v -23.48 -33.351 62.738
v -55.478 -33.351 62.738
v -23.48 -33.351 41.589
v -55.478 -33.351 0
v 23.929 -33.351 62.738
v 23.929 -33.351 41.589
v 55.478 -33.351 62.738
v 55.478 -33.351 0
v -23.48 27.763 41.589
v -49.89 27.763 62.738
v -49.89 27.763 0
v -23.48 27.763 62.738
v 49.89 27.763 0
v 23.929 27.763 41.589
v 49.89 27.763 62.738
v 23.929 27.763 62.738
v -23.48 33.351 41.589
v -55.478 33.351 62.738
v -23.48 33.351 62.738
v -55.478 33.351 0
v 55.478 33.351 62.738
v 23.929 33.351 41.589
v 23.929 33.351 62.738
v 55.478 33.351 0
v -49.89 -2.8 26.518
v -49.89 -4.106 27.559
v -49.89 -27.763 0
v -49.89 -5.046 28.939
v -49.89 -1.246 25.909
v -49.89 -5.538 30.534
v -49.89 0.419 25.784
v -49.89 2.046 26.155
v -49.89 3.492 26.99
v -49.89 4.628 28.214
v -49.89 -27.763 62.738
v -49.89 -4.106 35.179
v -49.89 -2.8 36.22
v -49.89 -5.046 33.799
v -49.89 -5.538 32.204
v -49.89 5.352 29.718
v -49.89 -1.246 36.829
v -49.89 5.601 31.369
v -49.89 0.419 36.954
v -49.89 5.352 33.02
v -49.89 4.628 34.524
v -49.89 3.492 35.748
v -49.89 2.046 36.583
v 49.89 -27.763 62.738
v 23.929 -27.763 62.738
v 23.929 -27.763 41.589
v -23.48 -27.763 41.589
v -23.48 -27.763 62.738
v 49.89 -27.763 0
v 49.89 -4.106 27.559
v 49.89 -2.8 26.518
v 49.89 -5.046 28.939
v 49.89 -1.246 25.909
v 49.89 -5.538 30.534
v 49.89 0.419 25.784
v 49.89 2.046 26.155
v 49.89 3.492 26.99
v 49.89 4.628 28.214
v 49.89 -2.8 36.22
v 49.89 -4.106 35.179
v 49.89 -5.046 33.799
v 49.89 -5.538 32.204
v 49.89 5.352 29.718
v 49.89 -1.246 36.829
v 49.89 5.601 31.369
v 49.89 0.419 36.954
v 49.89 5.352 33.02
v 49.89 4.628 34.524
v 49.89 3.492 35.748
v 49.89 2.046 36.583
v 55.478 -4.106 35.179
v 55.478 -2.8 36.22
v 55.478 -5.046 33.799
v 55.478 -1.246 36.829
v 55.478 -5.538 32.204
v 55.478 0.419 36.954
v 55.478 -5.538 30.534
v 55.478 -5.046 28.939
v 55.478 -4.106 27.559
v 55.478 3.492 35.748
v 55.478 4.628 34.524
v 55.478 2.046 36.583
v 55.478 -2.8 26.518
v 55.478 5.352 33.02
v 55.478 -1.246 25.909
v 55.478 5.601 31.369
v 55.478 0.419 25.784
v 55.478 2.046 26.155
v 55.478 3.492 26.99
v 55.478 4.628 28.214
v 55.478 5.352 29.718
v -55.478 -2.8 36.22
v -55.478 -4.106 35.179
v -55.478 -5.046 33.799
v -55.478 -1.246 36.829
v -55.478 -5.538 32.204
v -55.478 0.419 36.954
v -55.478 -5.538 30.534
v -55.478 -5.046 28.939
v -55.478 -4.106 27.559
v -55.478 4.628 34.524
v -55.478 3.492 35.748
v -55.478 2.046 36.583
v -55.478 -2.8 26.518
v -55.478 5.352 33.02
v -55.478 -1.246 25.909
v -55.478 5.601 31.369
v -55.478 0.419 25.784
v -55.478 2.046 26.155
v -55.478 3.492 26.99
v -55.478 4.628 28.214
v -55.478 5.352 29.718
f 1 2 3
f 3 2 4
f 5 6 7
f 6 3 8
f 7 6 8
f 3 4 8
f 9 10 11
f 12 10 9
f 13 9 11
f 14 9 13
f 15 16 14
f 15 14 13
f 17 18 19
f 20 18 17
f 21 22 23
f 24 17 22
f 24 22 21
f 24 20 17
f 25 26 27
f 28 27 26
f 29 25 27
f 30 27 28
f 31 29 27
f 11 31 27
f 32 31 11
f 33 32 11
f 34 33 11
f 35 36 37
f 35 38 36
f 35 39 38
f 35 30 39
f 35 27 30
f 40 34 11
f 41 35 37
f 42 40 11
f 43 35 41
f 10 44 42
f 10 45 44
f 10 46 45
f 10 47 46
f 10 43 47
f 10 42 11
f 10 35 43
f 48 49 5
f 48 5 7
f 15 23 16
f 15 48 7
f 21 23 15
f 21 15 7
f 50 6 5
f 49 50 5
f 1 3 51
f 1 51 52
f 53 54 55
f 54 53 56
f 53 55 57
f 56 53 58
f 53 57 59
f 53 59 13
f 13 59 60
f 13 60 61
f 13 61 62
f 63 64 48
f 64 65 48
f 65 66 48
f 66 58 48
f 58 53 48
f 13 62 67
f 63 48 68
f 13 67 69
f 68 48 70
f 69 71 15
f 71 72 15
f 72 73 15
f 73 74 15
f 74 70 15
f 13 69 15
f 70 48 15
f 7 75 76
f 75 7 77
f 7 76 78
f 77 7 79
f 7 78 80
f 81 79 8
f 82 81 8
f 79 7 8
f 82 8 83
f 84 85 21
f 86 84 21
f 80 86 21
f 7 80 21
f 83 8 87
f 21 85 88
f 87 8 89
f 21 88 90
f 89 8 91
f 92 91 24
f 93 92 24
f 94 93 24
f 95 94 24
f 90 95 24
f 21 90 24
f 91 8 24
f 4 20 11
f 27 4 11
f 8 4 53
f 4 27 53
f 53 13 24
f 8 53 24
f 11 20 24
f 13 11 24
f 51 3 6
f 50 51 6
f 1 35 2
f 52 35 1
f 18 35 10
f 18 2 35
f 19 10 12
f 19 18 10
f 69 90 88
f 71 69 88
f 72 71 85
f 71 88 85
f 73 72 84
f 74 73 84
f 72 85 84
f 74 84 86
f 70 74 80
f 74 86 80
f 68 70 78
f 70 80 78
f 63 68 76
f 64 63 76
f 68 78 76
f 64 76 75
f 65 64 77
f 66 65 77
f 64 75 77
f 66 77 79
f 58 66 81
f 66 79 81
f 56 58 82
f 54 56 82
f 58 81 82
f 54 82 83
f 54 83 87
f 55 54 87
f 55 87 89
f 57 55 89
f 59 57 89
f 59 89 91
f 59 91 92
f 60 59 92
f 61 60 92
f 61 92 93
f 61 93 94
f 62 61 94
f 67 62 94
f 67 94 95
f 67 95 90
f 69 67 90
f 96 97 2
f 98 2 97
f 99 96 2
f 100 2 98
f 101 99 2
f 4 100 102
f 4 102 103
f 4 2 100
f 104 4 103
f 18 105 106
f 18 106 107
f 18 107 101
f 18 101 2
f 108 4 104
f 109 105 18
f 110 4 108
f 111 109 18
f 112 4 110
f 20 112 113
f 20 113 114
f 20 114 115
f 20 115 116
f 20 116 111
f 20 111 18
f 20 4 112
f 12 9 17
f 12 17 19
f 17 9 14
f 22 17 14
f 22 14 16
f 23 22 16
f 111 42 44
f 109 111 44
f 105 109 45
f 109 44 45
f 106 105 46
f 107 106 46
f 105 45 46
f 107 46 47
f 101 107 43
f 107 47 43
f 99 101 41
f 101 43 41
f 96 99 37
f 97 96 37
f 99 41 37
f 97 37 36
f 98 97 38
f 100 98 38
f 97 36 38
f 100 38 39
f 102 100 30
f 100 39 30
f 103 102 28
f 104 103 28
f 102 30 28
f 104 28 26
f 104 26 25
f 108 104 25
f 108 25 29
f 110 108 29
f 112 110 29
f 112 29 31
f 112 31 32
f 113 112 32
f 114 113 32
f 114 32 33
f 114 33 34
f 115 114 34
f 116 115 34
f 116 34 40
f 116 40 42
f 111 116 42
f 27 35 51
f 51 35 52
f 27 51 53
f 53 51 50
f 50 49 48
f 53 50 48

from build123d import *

# Parameters (mm, degrees)
F0_W     = 110.95576
F0_H     = 66.701726
F1_DEPTH = 62.738
F2_R     = 5.600926
F3_DEPTH = 110.95676
F4_W     = 99.779762
F4_H     = 55.525728
F5_DEPTH = 62.739
F6_W     = 47.409441
F6_H     = 21.149314
F7_DEPTH = 66.702725


with BuildPart() as f1:
    # F0 (on Top) → F1 (new body)
    with BuildSketch(Plane.XY):
        Rectangle(F0_W, F0_H)
    extrude(amount=F1_DEPTH)

    # F2 (on face) → F3 (cut, through all)
    with BuildSketch(Plane.YZ.offset(55.47788)):
        with Locations((0, 31.369)):
            Circle(F2_R)
    extrude(amount=-F3_DEPTH, mode=Mode.SUBTRACT)

    # F4 (on face) → F5 (cut, through all)
    with BuildSketch(Plane.XY.offset(62.738)):
        Rectangle(F4_W, F4_H)
    extrude(amount=-F5_DEPTH, mode=Mode.SUBTRACT)

    # F6 (on face) → F7 (cut, through all)
    with BuildSketch(Plane.XZ.offset(33.350863)):
        with Locations((0.224762, 52.163343)):
            Rectangle(F6_W, F6_H)
    extrude(amount=-F7_DEPTH, mode=Mode.SUBTRACT)


solid = f1.part
